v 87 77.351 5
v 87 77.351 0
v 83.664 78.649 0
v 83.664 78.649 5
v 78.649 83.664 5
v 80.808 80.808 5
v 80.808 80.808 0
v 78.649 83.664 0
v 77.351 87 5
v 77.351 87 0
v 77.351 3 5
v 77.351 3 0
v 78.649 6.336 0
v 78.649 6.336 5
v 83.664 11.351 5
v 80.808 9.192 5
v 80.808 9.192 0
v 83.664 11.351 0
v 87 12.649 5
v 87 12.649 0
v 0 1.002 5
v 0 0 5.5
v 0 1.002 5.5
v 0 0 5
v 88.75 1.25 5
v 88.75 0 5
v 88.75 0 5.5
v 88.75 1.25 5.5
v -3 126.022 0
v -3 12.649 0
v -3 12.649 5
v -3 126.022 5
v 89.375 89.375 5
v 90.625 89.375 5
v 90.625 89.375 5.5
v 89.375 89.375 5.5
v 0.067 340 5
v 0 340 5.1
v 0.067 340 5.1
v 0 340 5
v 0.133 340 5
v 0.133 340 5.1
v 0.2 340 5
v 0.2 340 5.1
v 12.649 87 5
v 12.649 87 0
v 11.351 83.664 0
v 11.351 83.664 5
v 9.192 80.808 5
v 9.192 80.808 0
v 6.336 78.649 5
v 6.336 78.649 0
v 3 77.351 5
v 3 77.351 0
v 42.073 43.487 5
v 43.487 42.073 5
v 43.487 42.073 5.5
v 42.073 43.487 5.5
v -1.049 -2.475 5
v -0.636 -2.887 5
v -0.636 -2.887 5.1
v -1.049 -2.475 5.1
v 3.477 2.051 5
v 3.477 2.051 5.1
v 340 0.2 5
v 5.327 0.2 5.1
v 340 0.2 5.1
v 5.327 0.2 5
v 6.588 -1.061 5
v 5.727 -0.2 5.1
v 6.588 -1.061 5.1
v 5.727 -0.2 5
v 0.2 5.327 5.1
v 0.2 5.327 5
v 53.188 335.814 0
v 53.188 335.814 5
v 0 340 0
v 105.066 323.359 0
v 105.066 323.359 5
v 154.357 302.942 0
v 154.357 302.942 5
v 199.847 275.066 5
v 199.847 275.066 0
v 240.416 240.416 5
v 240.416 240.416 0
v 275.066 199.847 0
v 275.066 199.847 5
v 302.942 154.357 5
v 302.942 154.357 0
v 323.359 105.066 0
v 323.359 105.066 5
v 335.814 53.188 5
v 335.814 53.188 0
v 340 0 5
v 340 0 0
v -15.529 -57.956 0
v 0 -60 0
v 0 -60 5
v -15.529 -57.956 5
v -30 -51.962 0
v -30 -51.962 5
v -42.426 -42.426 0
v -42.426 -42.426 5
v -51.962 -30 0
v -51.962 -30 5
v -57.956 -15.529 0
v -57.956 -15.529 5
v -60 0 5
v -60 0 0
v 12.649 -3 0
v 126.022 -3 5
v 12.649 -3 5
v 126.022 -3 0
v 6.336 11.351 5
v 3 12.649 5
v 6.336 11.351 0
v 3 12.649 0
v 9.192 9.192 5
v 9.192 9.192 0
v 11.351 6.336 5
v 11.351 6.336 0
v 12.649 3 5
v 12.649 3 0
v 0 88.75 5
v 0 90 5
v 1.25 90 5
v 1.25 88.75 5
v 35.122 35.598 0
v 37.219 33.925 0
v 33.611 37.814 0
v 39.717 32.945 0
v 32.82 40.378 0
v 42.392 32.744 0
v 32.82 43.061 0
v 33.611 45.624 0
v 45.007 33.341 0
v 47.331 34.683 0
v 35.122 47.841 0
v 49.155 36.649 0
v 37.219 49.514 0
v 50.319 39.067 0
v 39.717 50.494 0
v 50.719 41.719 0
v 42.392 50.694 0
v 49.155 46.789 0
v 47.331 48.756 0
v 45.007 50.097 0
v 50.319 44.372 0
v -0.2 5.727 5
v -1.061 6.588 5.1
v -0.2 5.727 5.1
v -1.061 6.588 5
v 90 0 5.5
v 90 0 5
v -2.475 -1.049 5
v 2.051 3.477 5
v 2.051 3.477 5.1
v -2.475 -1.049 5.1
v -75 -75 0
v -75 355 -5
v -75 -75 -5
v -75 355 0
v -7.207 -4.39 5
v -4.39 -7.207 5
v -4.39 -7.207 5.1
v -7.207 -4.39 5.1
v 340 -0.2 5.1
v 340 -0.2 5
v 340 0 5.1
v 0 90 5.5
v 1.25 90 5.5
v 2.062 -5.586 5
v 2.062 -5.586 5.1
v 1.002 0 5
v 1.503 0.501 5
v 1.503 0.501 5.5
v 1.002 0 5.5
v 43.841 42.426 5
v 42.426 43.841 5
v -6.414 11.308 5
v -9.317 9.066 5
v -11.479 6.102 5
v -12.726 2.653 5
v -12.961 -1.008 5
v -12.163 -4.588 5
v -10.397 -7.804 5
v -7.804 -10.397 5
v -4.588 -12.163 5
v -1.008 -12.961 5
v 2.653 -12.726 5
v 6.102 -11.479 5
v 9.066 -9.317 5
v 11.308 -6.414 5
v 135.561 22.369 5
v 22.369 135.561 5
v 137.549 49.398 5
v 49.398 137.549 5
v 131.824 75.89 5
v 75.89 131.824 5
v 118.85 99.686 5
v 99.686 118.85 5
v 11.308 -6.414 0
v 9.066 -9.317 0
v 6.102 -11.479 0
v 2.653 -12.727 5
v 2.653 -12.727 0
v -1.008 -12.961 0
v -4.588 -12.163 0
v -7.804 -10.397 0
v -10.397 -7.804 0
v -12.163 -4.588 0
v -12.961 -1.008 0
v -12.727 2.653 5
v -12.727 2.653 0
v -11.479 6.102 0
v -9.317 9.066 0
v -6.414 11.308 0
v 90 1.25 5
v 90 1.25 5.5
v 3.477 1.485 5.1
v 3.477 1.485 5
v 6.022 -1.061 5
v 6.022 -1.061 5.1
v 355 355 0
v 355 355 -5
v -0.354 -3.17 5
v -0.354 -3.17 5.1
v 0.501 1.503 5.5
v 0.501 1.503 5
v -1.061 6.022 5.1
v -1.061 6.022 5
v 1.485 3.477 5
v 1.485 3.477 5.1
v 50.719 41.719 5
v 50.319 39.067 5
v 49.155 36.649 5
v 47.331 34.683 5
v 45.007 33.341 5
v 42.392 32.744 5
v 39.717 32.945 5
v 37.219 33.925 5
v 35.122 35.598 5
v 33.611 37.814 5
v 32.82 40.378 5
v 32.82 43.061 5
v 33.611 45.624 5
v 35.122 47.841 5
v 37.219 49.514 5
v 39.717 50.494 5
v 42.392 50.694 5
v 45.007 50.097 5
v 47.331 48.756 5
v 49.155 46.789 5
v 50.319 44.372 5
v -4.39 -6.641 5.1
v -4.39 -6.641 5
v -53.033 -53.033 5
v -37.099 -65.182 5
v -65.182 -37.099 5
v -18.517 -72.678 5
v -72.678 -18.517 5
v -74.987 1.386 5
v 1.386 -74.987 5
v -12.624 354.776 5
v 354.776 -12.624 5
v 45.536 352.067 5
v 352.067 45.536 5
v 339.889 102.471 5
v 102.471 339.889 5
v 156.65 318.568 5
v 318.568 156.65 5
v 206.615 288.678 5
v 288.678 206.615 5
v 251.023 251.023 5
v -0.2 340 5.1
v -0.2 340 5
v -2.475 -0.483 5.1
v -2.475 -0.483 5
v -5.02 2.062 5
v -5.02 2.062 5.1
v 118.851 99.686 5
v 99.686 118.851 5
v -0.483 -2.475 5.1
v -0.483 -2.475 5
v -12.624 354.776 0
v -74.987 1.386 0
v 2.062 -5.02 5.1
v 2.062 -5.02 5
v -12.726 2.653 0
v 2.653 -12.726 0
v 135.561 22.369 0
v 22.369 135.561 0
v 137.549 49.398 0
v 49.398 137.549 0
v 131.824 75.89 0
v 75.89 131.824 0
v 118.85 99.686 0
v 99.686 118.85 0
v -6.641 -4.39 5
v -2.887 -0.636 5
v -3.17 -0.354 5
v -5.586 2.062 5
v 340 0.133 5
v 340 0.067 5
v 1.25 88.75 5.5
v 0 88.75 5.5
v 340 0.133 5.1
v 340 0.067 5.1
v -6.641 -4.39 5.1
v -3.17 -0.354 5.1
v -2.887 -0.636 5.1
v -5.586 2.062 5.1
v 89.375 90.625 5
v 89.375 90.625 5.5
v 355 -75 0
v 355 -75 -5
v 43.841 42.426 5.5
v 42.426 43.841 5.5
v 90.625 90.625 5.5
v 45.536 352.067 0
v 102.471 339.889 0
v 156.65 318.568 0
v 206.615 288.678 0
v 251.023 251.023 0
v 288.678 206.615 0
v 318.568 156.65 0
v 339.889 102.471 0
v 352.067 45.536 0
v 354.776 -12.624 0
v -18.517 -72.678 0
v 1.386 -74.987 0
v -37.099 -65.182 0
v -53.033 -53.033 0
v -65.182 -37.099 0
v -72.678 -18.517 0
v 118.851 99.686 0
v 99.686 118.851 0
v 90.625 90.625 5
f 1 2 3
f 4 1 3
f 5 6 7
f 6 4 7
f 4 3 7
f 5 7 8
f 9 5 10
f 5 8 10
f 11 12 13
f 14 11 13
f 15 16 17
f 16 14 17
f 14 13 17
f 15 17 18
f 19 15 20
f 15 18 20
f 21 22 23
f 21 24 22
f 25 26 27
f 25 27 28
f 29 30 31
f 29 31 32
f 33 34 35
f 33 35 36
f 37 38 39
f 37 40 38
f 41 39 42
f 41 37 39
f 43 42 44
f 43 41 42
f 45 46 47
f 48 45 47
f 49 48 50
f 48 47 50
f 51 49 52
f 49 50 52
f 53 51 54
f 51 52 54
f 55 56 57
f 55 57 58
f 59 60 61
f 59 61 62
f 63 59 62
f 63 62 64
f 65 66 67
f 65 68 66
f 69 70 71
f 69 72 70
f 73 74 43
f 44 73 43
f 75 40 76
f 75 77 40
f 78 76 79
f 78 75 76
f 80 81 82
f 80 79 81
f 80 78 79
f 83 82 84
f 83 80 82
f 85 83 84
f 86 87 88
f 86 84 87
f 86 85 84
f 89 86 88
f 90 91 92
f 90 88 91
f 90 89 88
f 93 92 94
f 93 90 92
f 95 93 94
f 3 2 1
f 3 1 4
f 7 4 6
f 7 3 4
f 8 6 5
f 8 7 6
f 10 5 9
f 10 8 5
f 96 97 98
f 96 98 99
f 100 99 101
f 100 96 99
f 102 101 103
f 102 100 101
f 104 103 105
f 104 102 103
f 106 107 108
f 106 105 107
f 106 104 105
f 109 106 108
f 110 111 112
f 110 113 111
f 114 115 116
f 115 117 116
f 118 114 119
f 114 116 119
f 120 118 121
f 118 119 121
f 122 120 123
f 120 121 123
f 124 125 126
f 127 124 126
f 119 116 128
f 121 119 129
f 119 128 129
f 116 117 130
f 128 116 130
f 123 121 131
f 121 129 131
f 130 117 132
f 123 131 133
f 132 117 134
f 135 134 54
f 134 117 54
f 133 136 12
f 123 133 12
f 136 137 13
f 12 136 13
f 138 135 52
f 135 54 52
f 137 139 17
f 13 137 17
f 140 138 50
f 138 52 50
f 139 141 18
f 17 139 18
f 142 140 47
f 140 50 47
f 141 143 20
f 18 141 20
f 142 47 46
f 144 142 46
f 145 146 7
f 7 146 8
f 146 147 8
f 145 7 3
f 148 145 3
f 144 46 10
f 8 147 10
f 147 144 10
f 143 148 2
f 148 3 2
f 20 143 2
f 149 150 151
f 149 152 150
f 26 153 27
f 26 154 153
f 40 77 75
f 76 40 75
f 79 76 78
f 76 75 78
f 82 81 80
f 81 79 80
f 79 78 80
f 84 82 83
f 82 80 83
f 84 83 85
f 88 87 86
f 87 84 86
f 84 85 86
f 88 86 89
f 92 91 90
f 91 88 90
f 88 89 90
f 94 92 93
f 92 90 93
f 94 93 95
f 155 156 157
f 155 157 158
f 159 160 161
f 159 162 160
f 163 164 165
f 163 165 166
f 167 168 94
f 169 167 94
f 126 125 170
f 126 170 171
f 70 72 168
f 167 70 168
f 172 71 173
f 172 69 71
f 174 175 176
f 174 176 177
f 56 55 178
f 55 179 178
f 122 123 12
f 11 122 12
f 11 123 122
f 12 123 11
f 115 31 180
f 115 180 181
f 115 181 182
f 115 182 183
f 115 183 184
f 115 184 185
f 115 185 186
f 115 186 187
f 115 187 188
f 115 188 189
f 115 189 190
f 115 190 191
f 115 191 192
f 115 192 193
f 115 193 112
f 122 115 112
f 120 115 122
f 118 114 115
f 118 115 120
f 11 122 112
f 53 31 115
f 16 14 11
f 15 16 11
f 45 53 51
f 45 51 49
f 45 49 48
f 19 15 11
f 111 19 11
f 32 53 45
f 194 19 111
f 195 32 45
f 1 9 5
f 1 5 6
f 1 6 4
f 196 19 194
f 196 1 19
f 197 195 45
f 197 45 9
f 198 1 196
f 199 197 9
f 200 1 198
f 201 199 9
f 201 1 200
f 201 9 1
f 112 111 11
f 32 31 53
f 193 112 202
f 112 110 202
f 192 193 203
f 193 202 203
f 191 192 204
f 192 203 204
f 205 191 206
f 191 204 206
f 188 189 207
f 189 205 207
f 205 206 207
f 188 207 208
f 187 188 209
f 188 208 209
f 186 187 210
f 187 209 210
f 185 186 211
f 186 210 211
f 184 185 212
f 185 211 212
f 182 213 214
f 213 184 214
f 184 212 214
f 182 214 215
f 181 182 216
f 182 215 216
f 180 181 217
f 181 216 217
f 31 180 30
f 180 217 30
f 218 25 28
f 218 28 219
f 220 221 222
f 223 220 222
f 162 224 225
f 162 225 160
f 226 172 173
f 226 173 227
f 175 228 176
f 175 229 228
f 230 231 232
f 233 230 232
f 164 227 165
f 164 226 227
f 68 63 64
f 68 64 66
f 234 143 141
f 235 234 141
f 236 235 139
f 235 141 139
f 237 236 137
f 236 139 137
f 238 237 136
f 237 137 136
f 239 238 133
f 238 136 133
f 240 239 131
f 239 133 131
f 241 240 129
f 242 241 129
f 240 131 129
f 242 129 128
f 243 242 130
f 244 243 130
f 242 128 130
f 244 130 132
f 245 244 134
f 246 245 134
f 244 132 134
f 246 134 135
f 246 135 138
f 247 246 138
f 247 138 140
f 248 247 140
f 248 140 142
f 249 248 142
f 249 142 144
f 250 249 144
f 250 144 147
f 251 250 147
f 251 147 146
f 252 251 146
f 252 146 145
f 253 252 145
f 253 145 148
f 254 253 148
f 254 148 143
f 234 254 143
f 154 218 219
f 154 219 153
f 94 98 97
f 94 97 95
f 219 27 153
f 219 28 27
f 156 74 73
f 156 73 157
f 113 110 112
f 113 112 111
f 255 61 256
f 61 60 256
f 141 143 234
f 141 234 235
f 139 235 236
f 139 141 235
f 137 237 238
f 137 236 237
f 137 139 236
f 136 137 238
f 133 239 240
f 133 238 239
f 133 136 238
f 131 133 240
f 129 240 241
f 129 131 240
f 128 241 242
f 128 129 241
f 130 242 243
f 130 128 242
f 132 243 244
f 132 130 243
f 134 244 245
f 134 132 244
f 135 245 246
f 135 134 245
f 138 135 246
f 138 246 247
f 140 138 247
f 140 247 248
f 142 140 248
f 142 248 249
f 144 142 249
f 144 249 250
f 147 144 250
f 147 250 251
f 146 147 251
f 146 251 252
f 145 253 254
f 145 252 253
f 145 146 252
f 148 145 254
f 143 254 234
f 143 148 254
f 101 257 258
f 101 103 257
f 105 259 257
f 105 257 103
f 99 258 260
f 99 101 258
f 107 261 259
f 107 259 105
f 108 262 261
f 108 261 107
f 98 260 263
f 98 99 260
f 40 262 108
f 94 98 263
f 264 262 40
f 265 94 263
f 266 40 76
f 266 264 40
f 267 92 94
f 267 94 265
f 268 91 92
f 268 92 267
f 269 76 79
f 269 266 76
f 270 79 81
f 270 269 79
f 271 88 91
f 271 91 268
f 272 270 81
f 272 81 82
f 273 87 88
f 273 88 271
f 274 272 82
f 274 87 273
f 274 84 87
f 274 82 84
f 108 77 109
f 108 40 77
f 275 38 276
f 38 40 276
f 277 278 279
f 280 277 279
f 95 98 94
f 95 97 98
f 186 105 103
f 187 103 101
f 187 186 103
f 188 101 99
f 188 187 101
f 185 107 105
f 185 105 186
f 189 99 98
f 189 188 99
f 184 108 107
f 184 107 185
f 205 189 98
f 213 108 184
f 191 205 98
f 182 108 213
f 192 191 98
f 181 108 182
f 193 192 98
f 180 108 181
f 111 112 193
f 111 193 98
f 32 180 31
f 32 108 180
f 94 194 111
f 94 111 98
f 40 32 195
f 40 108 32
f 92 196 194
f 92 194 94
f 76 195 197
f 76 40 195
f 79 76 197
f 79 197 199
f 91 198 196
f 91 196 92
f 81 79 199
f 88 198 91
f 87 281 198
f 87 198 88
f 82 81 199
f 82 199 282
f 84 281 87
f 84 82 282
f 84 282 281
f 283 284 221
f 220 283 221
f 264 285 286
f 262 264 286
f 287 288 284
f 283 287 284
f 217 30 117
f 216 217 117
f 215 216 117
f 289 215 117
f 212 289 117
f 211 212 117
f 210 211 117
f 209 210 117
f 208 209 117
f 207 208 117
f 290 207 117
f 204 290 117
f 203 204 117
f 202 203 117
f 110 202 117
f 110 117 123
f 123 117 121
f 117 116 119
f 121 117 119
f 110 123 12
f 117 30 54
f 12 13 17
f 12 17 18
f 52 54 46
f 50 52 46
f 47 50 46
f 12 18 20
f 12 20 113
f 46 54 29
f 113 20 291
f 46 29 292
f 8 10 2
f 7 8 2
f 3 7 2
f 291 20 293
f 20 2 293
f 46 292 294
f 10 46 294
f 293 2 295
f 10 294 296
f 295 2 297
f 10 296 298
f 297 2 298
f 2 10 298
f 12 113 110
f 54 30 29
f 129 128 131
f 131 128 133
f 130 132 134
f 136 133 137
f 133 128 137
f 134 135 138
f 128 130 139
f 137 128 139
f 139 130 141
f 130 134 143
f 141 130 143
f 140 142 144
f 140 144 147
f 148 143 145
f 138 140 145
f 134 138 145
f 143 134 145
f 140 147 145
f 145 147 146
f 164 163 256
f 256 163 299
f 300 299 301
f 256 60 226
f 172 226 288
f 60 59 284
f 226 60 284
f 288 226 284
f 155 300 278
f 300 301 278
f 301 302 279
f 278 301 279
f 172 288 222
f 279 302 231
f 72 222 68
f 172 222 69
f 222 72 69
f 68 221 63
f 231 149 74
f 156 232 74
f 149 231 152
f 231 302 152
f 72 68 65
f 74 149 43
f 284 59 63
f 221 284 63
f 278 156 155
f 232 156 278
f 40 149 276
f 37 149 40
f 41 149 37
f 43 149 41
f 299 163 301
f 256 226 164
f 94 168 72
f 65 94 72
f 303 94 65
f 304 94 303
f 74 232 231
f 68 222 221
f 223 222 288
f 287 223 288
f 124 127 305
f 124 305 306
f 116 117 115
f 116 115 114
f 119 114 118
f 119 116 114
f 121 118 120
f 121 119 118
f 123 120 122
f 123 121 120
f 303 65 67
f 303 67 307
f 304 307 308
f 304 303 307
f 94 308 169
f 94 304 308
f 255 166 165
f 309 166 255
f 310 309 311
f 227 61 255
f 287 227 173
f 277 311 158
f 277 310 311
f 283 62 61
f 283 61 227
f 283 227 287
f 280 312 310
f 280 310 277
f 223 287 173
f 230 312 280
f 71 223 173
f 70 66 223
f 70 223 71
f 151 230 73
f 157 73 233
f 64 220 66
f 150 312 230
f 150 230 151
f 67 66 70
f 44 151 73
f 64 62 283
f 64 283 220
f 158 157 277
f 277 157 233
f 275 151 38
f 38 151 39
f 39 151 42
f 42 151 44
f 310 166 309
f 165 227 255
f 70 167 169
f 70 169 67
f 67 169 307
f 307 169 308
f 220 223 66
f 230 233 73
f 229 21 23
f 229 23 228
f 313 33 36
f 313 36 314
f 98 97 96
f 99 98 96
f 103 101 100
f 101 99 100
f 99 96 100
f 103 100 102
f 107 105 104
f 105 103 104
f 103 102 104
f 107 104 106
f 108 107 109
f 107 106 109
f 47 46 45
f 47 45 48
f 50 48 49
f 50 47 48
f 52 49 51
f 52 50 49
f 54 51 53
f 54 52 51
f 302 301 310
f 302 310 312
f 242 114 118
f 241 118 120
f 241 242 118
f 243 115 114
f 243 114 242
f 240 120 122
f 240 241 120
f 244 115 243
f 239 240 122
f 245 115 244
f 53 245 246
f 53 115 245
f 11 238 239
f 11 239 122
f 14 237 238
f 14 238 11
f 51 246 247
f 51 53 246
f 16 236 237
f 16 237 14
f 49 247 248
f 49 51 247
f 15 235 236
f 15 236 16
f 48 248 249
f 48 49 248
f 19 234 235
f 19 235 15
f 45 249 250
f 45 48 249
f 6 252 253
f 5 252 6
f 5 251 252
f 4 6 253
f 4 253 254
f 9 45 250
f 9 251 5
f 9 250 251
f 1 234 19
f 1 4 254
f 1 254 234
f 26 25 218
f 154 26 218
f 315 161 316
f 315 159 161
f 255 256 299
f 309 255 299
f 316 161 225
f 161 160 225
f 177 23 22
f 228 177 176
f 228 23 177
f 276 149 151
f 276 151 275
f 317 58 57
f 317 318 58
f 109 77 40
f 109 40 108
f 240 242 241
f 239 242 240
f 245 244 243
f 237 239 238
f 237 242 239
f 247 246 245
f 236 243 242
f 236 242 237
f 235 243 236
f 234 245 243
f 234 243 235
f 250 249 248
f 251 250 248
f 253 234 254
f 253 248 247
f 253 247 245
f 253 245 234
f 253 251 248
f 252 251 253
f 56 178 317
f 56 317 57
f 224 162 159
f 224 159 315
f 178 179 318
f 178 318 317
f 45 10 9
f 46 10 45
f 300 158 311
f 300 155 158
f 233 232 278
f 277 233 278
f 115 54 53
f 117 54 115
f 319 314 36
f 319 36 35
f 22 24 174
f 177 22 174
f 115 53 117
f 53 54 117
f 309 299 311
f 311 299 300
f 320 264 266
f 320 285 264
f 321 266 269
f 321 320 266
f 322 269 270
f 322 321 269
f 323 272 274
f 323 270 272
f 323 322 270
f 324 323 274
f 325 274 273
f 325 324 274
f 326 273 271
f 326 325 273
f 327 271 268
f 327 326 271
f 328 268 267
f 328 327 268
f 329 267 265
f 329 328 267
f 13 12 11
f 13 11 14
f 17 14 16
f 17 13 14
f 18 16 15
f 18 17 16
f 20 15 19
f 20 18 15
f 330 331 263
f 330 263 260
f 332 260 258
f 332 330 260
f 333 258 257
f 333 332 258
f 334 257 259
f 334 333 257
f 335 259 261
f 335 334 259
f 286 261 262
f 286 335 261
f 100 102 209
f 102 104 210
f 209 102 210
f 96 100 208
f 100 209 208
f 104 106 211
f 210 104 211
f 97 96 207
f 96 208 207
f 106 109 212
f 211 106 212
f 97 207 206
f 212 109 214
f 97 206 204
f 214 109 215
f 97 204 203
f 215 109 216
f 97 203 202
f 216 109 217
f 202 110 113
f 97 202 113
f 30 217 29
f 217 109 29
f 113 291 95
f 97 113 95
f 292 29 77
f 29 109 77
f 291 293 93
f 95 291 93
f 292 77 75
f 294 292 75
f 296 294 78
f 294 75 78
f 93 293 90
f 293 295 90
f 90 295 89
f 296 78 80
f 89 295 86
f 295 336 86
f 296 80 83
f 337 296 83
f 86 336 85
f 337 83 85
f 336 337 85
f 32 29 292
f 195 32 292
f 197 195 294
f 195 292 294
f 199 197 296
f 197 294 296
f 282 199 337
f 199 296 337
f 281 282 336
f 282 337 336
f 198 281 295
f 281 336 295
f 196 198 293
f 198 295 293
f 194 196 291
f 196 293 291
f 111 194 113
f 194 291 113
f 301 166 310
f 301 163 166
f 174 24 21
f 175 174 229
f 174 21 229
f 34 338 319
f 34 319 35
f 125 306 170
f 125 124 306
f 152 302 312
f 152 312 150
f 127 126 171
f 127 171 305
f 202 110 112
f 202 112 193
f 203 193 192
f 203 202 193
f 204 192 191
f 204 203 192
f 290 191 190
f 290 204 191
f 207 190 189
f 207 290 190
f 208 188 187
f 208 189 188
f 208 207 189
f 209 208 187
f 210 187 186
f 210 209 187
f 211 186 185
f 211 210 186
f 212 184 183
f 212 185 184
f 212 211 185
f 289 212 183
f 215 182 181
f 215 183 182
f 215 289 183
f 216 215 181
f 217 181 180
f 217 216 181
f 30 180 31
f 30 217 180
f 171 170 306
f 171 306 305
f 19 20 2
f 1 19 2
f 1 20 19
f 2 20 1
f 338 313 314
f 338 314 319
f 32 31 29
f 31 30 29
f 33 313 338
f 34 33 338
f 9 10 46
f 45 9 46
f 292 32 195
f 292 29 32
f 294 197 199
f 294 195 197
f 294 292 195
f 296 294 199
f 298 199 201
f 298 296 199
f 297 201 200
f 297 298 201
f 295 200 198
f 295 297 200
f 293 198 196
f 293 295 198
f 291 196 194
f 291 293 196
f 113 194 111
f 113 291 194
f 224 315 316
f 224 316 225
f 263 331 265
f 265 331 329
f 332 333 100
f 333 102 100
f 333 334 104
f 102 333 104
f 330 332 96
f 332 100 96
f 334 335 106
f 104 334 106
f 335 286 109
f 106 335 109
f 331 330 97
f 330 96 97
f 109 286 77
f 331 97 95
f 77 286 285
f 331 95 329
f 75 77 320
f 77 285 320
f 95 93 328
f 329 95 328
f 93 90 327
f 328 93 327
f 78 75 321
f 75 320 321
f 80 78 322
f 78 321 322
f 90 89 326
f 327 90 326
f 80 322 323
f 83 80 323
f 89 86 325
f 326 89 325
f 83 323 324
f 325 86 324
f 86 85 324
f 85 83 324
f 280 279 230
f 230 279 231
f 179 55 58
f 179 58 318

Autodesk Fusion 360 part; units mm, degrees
sketch "Base Sketch" plane through (0, 0, 0) normal (0, 0, 1) x (1, 0, 0)
  line L0 (-60, -60) -> (340, -60)
  line L1 (340, -60) -> (340, 340)
  line L2 (340, 340) -> (-60, 340)
  line L3 (-60, 340) -> (-60, -60)
  circle A0 centre (0, 0) radius 60
  circle A1 centre (0, 0) radius 340
  line L4 (0, 0) -> (90, 0)
  line L5 (90, 0) -> (90, 90)
  line L6 (90, 90) -> (0, 90)
  line L7 (0, 90) -> (0, 0)
  circle A2 centre (0, 0) radius 13
  circle A3 centre (90, 0) radius 13
  circle A4 centre (90, 90) radius 13
  circle A5 centre (0, 90) radius 13
  line L8 (-3, 93) -> (-3, -3)
  line L9 (-3, -3) -> (93, -3)
  line L10 (93, -3) -> (93, 93)
  line L11 (93, 93) -> (-3, 93)
  line L12 (3, 87) -> (3, 3)
  line L13 (3, 3) -> (87, 3)
  line L14 (87, 3) -> (87, 87)
  line L15 (87, 87) -> (3, 87)
  line L16 (90, 90) -> (0, 0) construction
  circle A6 centre (41.7193, 41.7193) radius 9
  circle A7 centre (42.78, 42.78) radius 95
  line L17 (-3, 93) -> (-3, 126.0217)
  line L18 (93, -3) -> (126.0217, -3)
  line L19 (0, 0) -> (340, 0) construction
  line L20 (0, 0) -> (0, 340) construction
  point P0 (42.78, 42.78)
  point P1 (-3, 12.6491)
  point P2 (12.6491, -3)
  dimension "d3" = 400
  dimension "d4" = 400
  dimension "d5" = 120
  dimension "d6" = 90
  dimension "d7" = 90
  dimension "d8" = 26
  dimension "d9" = 26
  dimension "d10" = 26
  dimension "d11" = 26
  dimension "d12" = 3
  dimension "d13" = -3
  dimension "d14" = 18
  dimension "d15" = 59
  dimension "d16" = 1.5
  dimension "d17" = 190
extrude "Extrude1" add sketch "Base Sketch" along normal blind 5 contours L0 L3 A0 A1 A7 | A0 A7 | A0 A2 L8 L9 A7 | A0 A3 L9 A7 L18 | A0 A5 L8 A7 L17 | A3 L9 L18 | A5 L8 L17 | A0 A2 L12 L13 A6 | A0 A3 A4 A5 L12 L13 L14 L15 A6 makes body 1 at (153.5619, -41, 0) makes body 2 at (74.8729, 44.3536, 0) in component "Grass"
sketch "Sketch1" plane through (0, 0, 5) normal (0, 0, 1) x (-1, 0, 0) in component "Grass"
  line L0 (3, -12.6491) -> (3, -126.0217)
  arc A0 (-126.0217, 3) -> (3, -126.0217) centre (-42.78, -42.78) ccw
  line L1 (-126.0217, 3) -> (-12.6491, 3)
  arc A1 (3, -12.6491) -> (-12.6491, 3) centre (0, 0) ccw
  arc A2 (-334.664, 60) -> (60, -334.664) centre (0, 0) ccw
  line L2 (60, -334.664) -> (60, 0)
  arc A3 (60, 0) -> (0, 60) centre (0, 0) ccw
  line L3 (0, 60) -> (-334.664, 60)
  line L4 (0, 0) -> (-340, 0)
  line L5 (0, 0) -> (0, -340)
  line L6 (0, 60) -> (-340, 0)
  line L7 (0, -340) -> (60, 0)
extrude "Extrude2" cut sketch "Sketch1" against normal up to surface (5 mm away) contours A2 L2 L7 | A2 L3 L6 bodies 1 in component "Grass"
sketch "Sketch1 (2)" plane through (0, 0, 0) normal (0, 0, 1) x (1, 0, 0) in component "Earth"
  line L0 (-60, -60) -> (340, -60)
  line L1 (340, -60) -> (340, 340)
  line L2 (340, 340) -> (-60, 340)
  line L3 (-60, 340) -> (-60, -60)
  line L4 (-75, 355) -> (-75, -75)
  line L5 (-75, -75) -> (355, -75)
  line L6 (355, -75) -> (355, 355)
  line L7 (355, 355) -> (-75, 355)
  dimension "d23" = 400
  dimension "d24" = 400
  dimension "d30" = 15
  dimension "d34" = 60
  dimension "d35" = 60
extrude "Extrude1'" add sketch "Sketch1 (2)" against normal blind 5 separate body contours L0 L1 L2 L3 | L4 L5 L6 L7 makes body 3 in component "Earth"
sketch "Sketch4" plane through (0, 0, 0) normal (0, 0, 1) x (1, 0, 0) in component "Dirt"
  line L0 (0, -60) -> (340, 0)
  arc A0 (340, 0) -> (0, 340) centre (0, 0) ccw
  line L1 (0, 340) -> (-60, 0)
  arc A1 (-60, 0) -> (0, -60) centre (0, 0) ccw
  line L2 (-3, 12.6491) -> (-3, 126.0217)
  arc A2 (126.0217, -3) -> (-3, 126.0217) centre (42.78, 42.78) ccw
  line L3 (126.0217, -3) -> (12.6491, -3)
  arc A3 (-3, 12.6491) -> (12.6491, -3) centre (0, 0) ccw
  circle A4 centre (41.7193, 41.7193) radius 9
  line L4 (3, 77.3509) -> (3, 12.6491)
  arc A5 (12.6491, 3) -> (3, 12.6491) centre (0, 0) ccw
  line L5 (12.6491, 3) -> (77.3509, 3)
  arc A6 (87, 12.6491) -> (77.3509, 3) centre (90, 0) ccw
  line L6 (87, 12.6491) -> (87, 77.3509)
  arc A7 (77.3509, 87) -> (87, 77.3509) centre (90, 90) ccw
  line L7 (77.3509, 87) -> (12.6491, 87)
  arc A8 (3, 77.3509) -> (12.6491, 87) centre (0, 90) ccw
  arc A9 (-74.9872, 1.386) -> (1.386, -74.9872) centre (0, 0) ccw
  line L8 (1.386, -74.9872) -> (354.7755, -12.6243)
  arc A10 (354.7755, -12.6243) -> (-12.6243, 354.7755) centre (0, 0) ccw
  line L9 (-12.6243, 354.7755) -> (-74.9872, 1.386)
  dimension "d31" = 15
extrude "Extrude1''" add sketch "Sketch4" along normal blind 5 separate body makes body 4 at (232.0538, -29.2038, 0) makes body 5 at (103.8497, 46.4661, 0) makes body 6 at (50.7081, 41.2707, 3.3333) in component "Dirt"
ref_plane "WorkPlane1" through (0, 0, 5) normal (0, 0, 1) x (1, 0, 0) in component "Bases"
sketch "Sketch1 (3)" plane through (0, 0, 5) normal (0, 0, 1) x (1, 0, 0) in component "Bases"
  line L0 (77.3509, 3) -> (12.6491, 3)
  arc A0 (12.6491, 3) -> (3, 12.6491) centre (0, 0) ccw
  line L1 (3, 12.6491) -> (3, 77.3509)
  arc A1 (3, 77.3509) -> (12.6491, 87) centre (0, 90) ccw
  line L2 (12.6491, 87) -> (77.3509, 87)
  arc A2 (77.3509, 87) -> (87, 77.3509) centre (90, 90) ccw
  line L3 (87, 77.3509) -> (87, 12.6491)
  arc A3 (87, 12.6491) -> (77.3509, 3) centre (90, 0) ccw
  arc A4 (126.0217, -3) -> (-3, 126.0217) centre (42.78, 42.78) ccw
  line L4 (-3, 126.0217) -> (-3, 12.6491)
  arc A5 (-3, 12.6491) -> (12.6491, -3) centre (0, 0) ccw
  line L5 (12.6491, -3) -> (126.0217, -3)
  circle A6 centre (41.7193, 41.7193) radius 9
  line L6 (90, 0) -> (88.75, 0)
  line L7 (88.75, 0) -> (88.75, 1.25)
  line L8 (88.75, 1.25) -> (90, 1.25)
  line L9 (90, 1.25) -> (90, 0)
  line L10 (0, 90) -> (1.25, 90)
  line L11 (1.25, 90) -> (1.25, 88.75)
  line L12 (1.25, 88.75) -> (0, 88.75)
  line L13 (0, 88.75) -> (0, 90)
  line L14 (90.625, 89.375) -> (89.375, 89.375)
  line L15 (89.375, 89.375) -> (89.375, 90.625)
  line L16 (89.375, 90.625) -> (90.625, 90.625)
  line L17 (90.625, 90.625) -> (90.625, 89.375)
  line L18 (90.625, 89.375) -> (89.375, 90.625) construction
  line L19 (89.375, 89.375) -> (90.625, 90.625) construction
  line L20 (42.78, 42.78) -> (41.7193, 41.7193) construction
  line L21 (42.78, 42.78) -> (43.4871, 42.0729) construction
  line L22 (42.78, 42.78) -> (42.0729, 43.4871) construction
  line L23 (43.4871, 42.0729) -> (42.0729, 43.4871)
  line L24 (42.0729, 43.4871) -> (42.4264, 43.8406)
  line L25 (42.4264, 43.8406) -> (43.8406, 42.4264)
  line L26 (43.8406, 42.4264) -> (43.4871, 42.0729)
  line L27 (0, 0) -> (41.7193, 41.7193) construction
  line L28 (0, 0) -> (0, 1.0017)
  line L29 (0, 1.0017) -> (0.5009, 1.5026)
  line L30 (0.5009, 1.5026) -> (1.5026, 0.5009)
  line L31 (1.5026, 0.5009) -> (1.0017, 0)
  line L32 (0, 0) -> (1.0017, 0)
  point P0 (90, 90)
  dimension "d40" = 1.25
  dimension "d41" = 1.25
  dimension "d42" = 1.25
  dimension "d43" = 1.25
  dimension "d44" = 1.25
  dimension "d45" = 1.25
  dimension "d48" = 1
  dimension "d49" = 1
  dimension "d50" = 0.5
  dimension "d51" = 0.7083
  dimension "d52" = 1.4167
extrude "Extrude1'''" add sketch "Sketch1 (3)" along normal blind 0.5 separate body contours L6 L7 L8 L9 | L10 L11 L12 L13 | L14 L15 L16 L17 | L23 L24 L25 L26 | L28 L29 L30 L31 L32 makes body 7 at (43.0157, 42.5443, 5.1667) makes body 8 at (89.5833, 0.4167, 5) makes body 9 at (90.2083, 89.7917, 5) makes body 10 at (0.3339, 0.3339, 5) makes body 11 at (0.4167, 89.5833, 5) in component "Bases"
ref_plane "WorkPlane1" through (0, 0, 5) normal (0, 0, 1) x (1, 0, 0) in component "Lines"
sketch "Lines Sketch" plane through (0, 0, 5) normal (0, 0, 1) x (1, 0, 0) in component "Lines"
  circle A0 centre (41.7193, 41.7193) radius 9
  line L0 (3, 77.3509) -> (3, 12.6491)
  arc A1 (12.6491, 3) -> (3, 12.6491) centre (0, 0) ccw
  line L1 (12.6491, 3) -> (77.3509, 3)
  arc A2 (87, 12.6491) -> (77.3509, 3) centre (90, 0) ccw
  line L2 (87, 12.6491) -> (87, 77.3509)
  arc A3 (77.3509, 87) -> (87, 77.3509) centre (90, 90) ccw
  line L3 (77.3509, 87) -> (12.6491, 87)
  arc A4 (3, 77.3509) -> (12.6491, 87) centre (0, 90) ccw
  line L4 (0, 340) -> (-60, 0)
  arc A5 (-60, 0) -> (0, -60) centre (0, 0) ccw
  line L5 (0, -60) -> (340, 0)
  arc A6 (340, 0) -> (0, 340) centre (0, 0) ccw
  line L6 (-3, 12.6491) -> (-3, 126.0217)
  arc A7 (126.0217, -3) -> (-3, 126.0217) centre (42.78, 42.78) ccw
  line L7 (126.0217, -3) -> (12.6491, -3)
  arc A8 (-3, 12.6491) -> (12.6491, -3) centre (0, 0) ccw
  line L8 (0, 0) -> (41.7193, 41.7193) construction
  line L9 (0, 1.0017) -> (0, 0)
  line L10 (0, 0) -> (1.0017, 0)
  line L11 (1.0017, 0) -> (1.5026, 0.5009)
  line L12 (1.5026, 0.5009) -> (0.5009, 1.5026)
  line L13 (0.5009, 1.5026) -> (0, 1.0017)
  line L14 (-0.766, -2.4749) -> (3.4766, 1.7678)
  line L15 (3.4766, 1.7678) -> (6.305, -1.0607)
  line L16 (6.305, -1.0607) -> (2.0624, -5.3033)
  line L17 (2.0624, -5.3033) -> (-0.766, -2.4749)
  line L18 (-1.0607, 6.305) -> (1.7678, 3.4766)
  line L19 (-5.3033, 2.0624) -> (-1.0607, 6.305)
  line L20 (1.7678, 3.4766) -> (-2.4749, -0.766)
  line L21 (-2.4749, -0.766) -> (-5.3033, 2.0624)
  line L22 (-0.3536, -2.8874) -> (-4.39, -6.9238)
  line L23 (-4.39, -6.9238) -> (-6.9238, -4.39)
  line L24 (-6.9238, -4.39) -> (-2.8874, -0.3536)
  line L25 (0, 0) -> (340, 0) construction
  line L26 (0, 0) -> (0, 340) construction
  line L27 (5.2444, 0) -> (340, 0)
  line L28 (0, 5.2444) -> (0, 340)
  line L29 (5.2444, -0.2) -> (340, -0.2)
  line L30 (5.2444, 0.2) -> (340, 0.2)
  line L31 (-0.4832, -2.4749) -> (3.4766, 1.4849)
  line L32 (3.4766, 1.4849) -> (6.0222, -1.0607)
  line L33 (6.0222, -1.0607) -> (2.0624, -5.0205)
  line L34 (2.0624, -5.0205) -> (-0.4832, -2.4749)
  line L35 (-1.0489, -2.4749) -> (3.4766, 2.0506)
  line L36 (3.4766, 2.0506) -> (6.5879, -1.0607)
  line L37 (6.5879, -1.0607) -> (2.0624, -5.5861)
  line L38 (2.0624, -5.5861) -> (-1.0489, -2.4749)
  line L39 (0.2, 5.2444) -> (0.2, 340)
  line L40 (-0.2, 5.2444) -> (-0.2, 340)
  line L41 (-2.4749, -0.4832) -> (-5.0205, 2.0624)
  line L42 (-5.0205, 2.0624) -> (-1.0607, 6.0222)
  line L43 (-1.0607, 6.0222) -> (1.4849, 3.4766)
  line L44 (1.4849, 3.4766) -> (-2.4749, -0.4832)
  line L45 (-2.4749, -1.0489) -> (-5.5861, 2.0624)
  line L46 (-5.5861, 2.0624) -> (-1.0607, 6.5879)
  line L47 (-1.0607, 6.5879) -> (2.0506, 3.4766)
  line L48 (2.0506, 3.4766) -> (-2.4749, -1.0489)
  line L49 (-0.495, -2.7459) -> (-4.39, -6.6409)
  line L50 (-4.39, -6.6409) -> (-6.6409, -4.39)
  line L51 (-6.6409, -4.39) -> (-2.7459, -0.495)
  line L52 (-0.2121, -3.0288) -> (-4.39, -7.2066)
  line L53 (-4.39, -7.2066) -> (-7.2066, -4.39)
  line L54 (-7.2066, -4.39) -> (-3.0288, -0.2121)
  line L55 (340, -0.2) -> (340, 0.2)
  line L56 (0.2, 340) -> (-0.2, 340)
  dimension "d57" = 0.5
  dimension "d58" = 4
  dimension "d59" = 6
  dimension "d60" = 3
  dimension "d61" = 4
  dimension "d62" = 6
  dimension "d63" = 3
  dimension "d65" = 0.5
  dimension "d66" = 3.5833
  dimension "d67" = 8
  dimension "d69" = 0.2
  dimension "d70" = -0.2
  dimension "d71" = 0.2
  dimension "d72" = -0.2
  dimension "d73" = 0.2
  dimension "d74" = -0.2
  dimension "d75" = 0.2
  dimension "d76" = -0.2
  dimension "d77" = 0.2
  dimension "d78" = -0.2
extrude "Extrude1''''" add sketch "Lines Sketch" along normal blind 0.1 separate body contours L4 A7 L28 L40 | A6 A7 L28 L39 L56 | L4 L40 L56 | A7 L28 L40 L47 | A7 L28 L39 L47 | A6 A7 L27 L30 L55 | L18 L20 L21 L28 L45 L47 L48 L51 | L18 L28 L40 L47 | L18 L19 L21 L40 L45 L46 L47 L54 | L5 L29 L55 | L5 A7 L27 L29 | A7 L27 L30 L36 | L18 L19 L20 L21 | A7 L27 L29 L36 | L14 L15 L17 L27 L35 L36 L38 L49 | L15 L27 L29 L36 | L15 L16 L17 L29 L36 L37 L38 L52 | L21 L24 L45 L54 | L22 L23 L24 L38 L45 L52 L53 L54 | L14 L15 L16 L17 | L22 L23 L24 L38 L45 L49 L50 L51 | L21 L24 L45 L51 | L17 L22 L38 L49 | L17 L22 L38 L52 makes body 12 in component "Lines"
ref_plane "WorkPlane2" through (0, 0, 10.6) normal (0, 0, 1) x (1, 0, 0)
sketch "Final Sketch" plane through (0, 0, 10.6) normal (0, 0, 1) x (1, 0, 0)
  line L0 (-1.0607, 6.0222) -> (1.4849, 3.4766)
  line L1 (1.4849, 3.4766) -> (-2.4749, -0.4832)
  line L2 (-2.4749, -0.4832) -> (-5.0205, 2.0624)
  line L3 (-5.0205, 2.0624) -> (-1.0607, 6.0222)
  line L4 (6.0222, -1.0607) -> (2.0624, -5.0205)
  line L5 (2.0624, -5.0205) -> (-0.4832, -2.4749)
  line L6 (-0.4832, -2.4749) -> (3.4766, 1.4849)
  line L7 (3.4766, 1.4849) -> (6.0222, -1.0607)
  line L8 (0.2, 5.3272) -> (0.2, 339.9999)
  arc A0 (0.2, 339.9999) -> (0, 340) centre (0, 0) ccw
  line L9 (0, 340) -> (-0.2, 340)
  line L10 (-0.2, 340) -> (-0.2, 5.7272)
  line L11 (-0.2, 5.7272) -> (-1.0607, 6.5879)
  line L12 (-1.0607, 6.5879) -> (-5.5861, 2.0624)
  line L13 (-5.5861, 2.0624) -> (-3.1702, -0.3536)
  line L14 (-3.1702, -0.3536) -> (-7.2066, -4.39)
  line L15 (-7.2066, -4.39) -> (-4.39, -7.2066)
  line L16 (-4.39, -7.2066) -> (-0.3536, -3.1702)
  line L17 (-0.3536, -3.1702) -> (2.0624, -5.5861)
  line L18 (2.0624, -5.5861) -> (6.5879, -1.0607)
  line L19 (6.5879, -1.0607) -> (5.7272, -0.2)
  line L20 (5.7272, -0.2) -> (340, -0.2)
  line L21 (340, -0.2) -> (340, 0)
  arc A1 (340, 0) -> (339.9999, 0.2) centre (0, 0) ccw
  line L22 (339.9999, 0.2) -> (5.3272, 0.2)
  line L23 (5.3272, 0.2) -> (3.4766, 2.0506)
  line L24 (3.4766, 2.0506) -> (-1.0489, -2.4749)
  line L25 (-1.0489, -2.4749) -> (-0.6364, -2.8874)
  line L26 (-0.6364, -2.8874) -> (-4.39, -6.6409)
  line L27 (-4.39, -6.6409) -> (-6.6409, -4.39)
  line L28 (-6.6409, -4.39) -> (-2.8874, -0.6364)
  line L29 (-2.8874, -0.6364) -> (-2.4749, -1.0489)
  line L30 (-2.4749, -1.0489) -> (2.0506, 3.4766)
  line L31 (2.0506, 3.4766) -> (0.2, 5.3272)
  line L32 (0, 340) -> (-60, 0)
  arc A2 (-60, 0) -> (0, -60) centre (0, 0) ccw
  line L33 (0, -60) -> (340, 0)
  arc A3 (340, 0) -> (0, 340) centre (0, 0) ccw
  line L34 (-3, 12.6491) -> (-3, 126.0217)
  arc A4 (126.0217, -3) -> (-3, 126.0217) centre (42.78, 42.78) ccw
  line L35 (126.0217, -3) -> (12.6491, -3)
  arc A5 (-3, 12.6491) -> (12.6491, -3) centre (0, 0) ccw
  circle A6 centre (41.7193, 41.7193) radius 9
  line L36 (3, 77.3509) -> (3, 12.6491)
  arc A7 (12.6491, 3) -> (3, 12.6491) centre (0, 0) ccw
  line L37 (12.6491, 3) -> (77.3509, 3)
  arc A8 (87, 12.6491) -> (77.3509, 3) centre (90, 0) ccw
  line L38 (87, 12.6491) -> (87, 77.3509)
  arc A9 (77.3509, 87) -> (87, 77.3509) centre (90, 90) ccw
  line L39 (77.3509, 87) -> (12.6491, 87)
  arc A10 (3, 77.3509) -> (12.6491, 87) centre (0, 90) ccw
  line L40 (43.8406, 42.4264) -> (42.4264, 43.8406)
  line L41 (42.4264, 43.8406) -> (42.0729, 43.4871)
  line L42 (42.0729, 43.4871) -> (43.4871, 42.0729)
  line L43 (43.4871, 42.0729) -> (43.8406, 42.4264)
  line L44 (0, 1.0017) -> (0, 0)
  line L45 (0, 0) -> (1.0017, 0)
  line L46 (1.0017, 0) -> (1.5026, 0.5009)
  line L47 (1.5026, 0.5009) -> (0.5009, 1.5026)
  line L48 (0.5009, 1.5026) -> (0, 1.0017)
  line L49 (90, 1.25) -> (88.75, 1.25)
  line L50 (88.75, 1.25) -> (88.75, 0)
  line L51 (88.75, 0) -> (90, 0)
  line L52 (90, 0) -> (90, 1.25)
  line L53 (90.625, 90.625) -> (89.375, 90.625)
  line L54 (89.375, 90.625) -> (89.375, 89.375)
  line L55 (89.375, 89.375) -> (90.625, 89.375)
  line L56 (90.625, 89.375) -> (90.625, 90.625)
  line L57 (0, 88.75) -> (1.25, 88.75)
  line L58 (1.25, 88.75) -> (1.25, 90)
  line L59 (1.25, 90) -> (0, 90)
  line L60 (0, 90) -> (0, 88.75)
  line L61 (355, 355) -> (-75, 355)
  line L62 (-75, 355) -> (-75, -75)
  line L63 (-75, -75) -> (355, -75)
  line L64 (355, -75) -> (355, 355)
  arc A11 (-60, 0) -> (0, -60) centre (0, 0) ccw
  line L65 (-60, 0) -> (0, 340)
  arc A12 (340, 0) -> (0, 340) centre (0, 0) ccw
  line L66 (340, 0) -> (0, -60)
  line L67 (-12.6243, 354.7755) -> (-74.9872, 1.386)
  arc A13 (-74.9872, 1.386) -> (1.386, -74.9872) centre (0, 0) ccw
  line L68 (1.386, -74.9872) -> (354.7755, -12.6243)
  arc A14 (354.7755, -12.6243) -> (-12.6243, 354.7755) centre (0, 0) ccw
component "Grass" placed x (1, 0, 0) y (0, 1, 0) z (0, 0, 1) at (0, 0, 0)
component "Earth" placed x (1, 0, 0) y (0, 1, 0) z (0, 0, 1) at (0, 0, 0)
component "Dirt" placed x (1, 0, 0) y (0, 1, 0) z (0, 0, 1) at (0, 0, 0)
component "Bases" placed x (1, 0, 0) y (0, 1, 0) z (0, 0, 1) at (0, 0, 0)
component "Lines" placed x (1, 0, 0) y (0, 1, 0) z (0, 0, 1) at (0, 0, 0)
equation "d3 = Radius + 60 mm"
equation "d4 = Radius + 60 mm"
equation "d21 = Height"
equation "d23 = Radius + 60 mm"
equation "d24 = Radius + 60 mm"
equation "d25 = -Height"
equation "d30 = Padding"
equation "d31 = Padding"
equation "d32 = Height"
equation "Height = 5 mm"
equation "Padding = 15 mm"
equation "Radius = 340 mm"
equation "d39 = Height"
equation "d51 = ( 8.5 / 12 ) * 1 mm"
equation "d52 = ( 17 / 12 ) * 1 mm"
equation "d53 = BaseHeight"
equation "BaseHeight = 0.5 mm"
equation "d56 = Height"
equation "d66 = ( 43 / 12 ) * 1 mm"
equation "LineThickness = 0.4 mm"
equation "d69 = LineThickness / 2"
equation "d70 = -LineThickness / 2"
equation "d71 = LineThickness / 2"
equation "d72 = -LineThickness / 2"
equation "d73 = LineThickness / 2"
equation "d74 = -LineThickness / 2"
equation "d75 = LineThickness / 2"
equation "d76 = -LineThickness / 2"
equation "d77 = LineThickness / 2"
equation "d78 = -LineThickness / 2"
equation "d79 = LineHeight"
equation "LineHeight = 0.1 mm"
equation "d82 = 2 * Height + BaseHeight + LineHeight"
